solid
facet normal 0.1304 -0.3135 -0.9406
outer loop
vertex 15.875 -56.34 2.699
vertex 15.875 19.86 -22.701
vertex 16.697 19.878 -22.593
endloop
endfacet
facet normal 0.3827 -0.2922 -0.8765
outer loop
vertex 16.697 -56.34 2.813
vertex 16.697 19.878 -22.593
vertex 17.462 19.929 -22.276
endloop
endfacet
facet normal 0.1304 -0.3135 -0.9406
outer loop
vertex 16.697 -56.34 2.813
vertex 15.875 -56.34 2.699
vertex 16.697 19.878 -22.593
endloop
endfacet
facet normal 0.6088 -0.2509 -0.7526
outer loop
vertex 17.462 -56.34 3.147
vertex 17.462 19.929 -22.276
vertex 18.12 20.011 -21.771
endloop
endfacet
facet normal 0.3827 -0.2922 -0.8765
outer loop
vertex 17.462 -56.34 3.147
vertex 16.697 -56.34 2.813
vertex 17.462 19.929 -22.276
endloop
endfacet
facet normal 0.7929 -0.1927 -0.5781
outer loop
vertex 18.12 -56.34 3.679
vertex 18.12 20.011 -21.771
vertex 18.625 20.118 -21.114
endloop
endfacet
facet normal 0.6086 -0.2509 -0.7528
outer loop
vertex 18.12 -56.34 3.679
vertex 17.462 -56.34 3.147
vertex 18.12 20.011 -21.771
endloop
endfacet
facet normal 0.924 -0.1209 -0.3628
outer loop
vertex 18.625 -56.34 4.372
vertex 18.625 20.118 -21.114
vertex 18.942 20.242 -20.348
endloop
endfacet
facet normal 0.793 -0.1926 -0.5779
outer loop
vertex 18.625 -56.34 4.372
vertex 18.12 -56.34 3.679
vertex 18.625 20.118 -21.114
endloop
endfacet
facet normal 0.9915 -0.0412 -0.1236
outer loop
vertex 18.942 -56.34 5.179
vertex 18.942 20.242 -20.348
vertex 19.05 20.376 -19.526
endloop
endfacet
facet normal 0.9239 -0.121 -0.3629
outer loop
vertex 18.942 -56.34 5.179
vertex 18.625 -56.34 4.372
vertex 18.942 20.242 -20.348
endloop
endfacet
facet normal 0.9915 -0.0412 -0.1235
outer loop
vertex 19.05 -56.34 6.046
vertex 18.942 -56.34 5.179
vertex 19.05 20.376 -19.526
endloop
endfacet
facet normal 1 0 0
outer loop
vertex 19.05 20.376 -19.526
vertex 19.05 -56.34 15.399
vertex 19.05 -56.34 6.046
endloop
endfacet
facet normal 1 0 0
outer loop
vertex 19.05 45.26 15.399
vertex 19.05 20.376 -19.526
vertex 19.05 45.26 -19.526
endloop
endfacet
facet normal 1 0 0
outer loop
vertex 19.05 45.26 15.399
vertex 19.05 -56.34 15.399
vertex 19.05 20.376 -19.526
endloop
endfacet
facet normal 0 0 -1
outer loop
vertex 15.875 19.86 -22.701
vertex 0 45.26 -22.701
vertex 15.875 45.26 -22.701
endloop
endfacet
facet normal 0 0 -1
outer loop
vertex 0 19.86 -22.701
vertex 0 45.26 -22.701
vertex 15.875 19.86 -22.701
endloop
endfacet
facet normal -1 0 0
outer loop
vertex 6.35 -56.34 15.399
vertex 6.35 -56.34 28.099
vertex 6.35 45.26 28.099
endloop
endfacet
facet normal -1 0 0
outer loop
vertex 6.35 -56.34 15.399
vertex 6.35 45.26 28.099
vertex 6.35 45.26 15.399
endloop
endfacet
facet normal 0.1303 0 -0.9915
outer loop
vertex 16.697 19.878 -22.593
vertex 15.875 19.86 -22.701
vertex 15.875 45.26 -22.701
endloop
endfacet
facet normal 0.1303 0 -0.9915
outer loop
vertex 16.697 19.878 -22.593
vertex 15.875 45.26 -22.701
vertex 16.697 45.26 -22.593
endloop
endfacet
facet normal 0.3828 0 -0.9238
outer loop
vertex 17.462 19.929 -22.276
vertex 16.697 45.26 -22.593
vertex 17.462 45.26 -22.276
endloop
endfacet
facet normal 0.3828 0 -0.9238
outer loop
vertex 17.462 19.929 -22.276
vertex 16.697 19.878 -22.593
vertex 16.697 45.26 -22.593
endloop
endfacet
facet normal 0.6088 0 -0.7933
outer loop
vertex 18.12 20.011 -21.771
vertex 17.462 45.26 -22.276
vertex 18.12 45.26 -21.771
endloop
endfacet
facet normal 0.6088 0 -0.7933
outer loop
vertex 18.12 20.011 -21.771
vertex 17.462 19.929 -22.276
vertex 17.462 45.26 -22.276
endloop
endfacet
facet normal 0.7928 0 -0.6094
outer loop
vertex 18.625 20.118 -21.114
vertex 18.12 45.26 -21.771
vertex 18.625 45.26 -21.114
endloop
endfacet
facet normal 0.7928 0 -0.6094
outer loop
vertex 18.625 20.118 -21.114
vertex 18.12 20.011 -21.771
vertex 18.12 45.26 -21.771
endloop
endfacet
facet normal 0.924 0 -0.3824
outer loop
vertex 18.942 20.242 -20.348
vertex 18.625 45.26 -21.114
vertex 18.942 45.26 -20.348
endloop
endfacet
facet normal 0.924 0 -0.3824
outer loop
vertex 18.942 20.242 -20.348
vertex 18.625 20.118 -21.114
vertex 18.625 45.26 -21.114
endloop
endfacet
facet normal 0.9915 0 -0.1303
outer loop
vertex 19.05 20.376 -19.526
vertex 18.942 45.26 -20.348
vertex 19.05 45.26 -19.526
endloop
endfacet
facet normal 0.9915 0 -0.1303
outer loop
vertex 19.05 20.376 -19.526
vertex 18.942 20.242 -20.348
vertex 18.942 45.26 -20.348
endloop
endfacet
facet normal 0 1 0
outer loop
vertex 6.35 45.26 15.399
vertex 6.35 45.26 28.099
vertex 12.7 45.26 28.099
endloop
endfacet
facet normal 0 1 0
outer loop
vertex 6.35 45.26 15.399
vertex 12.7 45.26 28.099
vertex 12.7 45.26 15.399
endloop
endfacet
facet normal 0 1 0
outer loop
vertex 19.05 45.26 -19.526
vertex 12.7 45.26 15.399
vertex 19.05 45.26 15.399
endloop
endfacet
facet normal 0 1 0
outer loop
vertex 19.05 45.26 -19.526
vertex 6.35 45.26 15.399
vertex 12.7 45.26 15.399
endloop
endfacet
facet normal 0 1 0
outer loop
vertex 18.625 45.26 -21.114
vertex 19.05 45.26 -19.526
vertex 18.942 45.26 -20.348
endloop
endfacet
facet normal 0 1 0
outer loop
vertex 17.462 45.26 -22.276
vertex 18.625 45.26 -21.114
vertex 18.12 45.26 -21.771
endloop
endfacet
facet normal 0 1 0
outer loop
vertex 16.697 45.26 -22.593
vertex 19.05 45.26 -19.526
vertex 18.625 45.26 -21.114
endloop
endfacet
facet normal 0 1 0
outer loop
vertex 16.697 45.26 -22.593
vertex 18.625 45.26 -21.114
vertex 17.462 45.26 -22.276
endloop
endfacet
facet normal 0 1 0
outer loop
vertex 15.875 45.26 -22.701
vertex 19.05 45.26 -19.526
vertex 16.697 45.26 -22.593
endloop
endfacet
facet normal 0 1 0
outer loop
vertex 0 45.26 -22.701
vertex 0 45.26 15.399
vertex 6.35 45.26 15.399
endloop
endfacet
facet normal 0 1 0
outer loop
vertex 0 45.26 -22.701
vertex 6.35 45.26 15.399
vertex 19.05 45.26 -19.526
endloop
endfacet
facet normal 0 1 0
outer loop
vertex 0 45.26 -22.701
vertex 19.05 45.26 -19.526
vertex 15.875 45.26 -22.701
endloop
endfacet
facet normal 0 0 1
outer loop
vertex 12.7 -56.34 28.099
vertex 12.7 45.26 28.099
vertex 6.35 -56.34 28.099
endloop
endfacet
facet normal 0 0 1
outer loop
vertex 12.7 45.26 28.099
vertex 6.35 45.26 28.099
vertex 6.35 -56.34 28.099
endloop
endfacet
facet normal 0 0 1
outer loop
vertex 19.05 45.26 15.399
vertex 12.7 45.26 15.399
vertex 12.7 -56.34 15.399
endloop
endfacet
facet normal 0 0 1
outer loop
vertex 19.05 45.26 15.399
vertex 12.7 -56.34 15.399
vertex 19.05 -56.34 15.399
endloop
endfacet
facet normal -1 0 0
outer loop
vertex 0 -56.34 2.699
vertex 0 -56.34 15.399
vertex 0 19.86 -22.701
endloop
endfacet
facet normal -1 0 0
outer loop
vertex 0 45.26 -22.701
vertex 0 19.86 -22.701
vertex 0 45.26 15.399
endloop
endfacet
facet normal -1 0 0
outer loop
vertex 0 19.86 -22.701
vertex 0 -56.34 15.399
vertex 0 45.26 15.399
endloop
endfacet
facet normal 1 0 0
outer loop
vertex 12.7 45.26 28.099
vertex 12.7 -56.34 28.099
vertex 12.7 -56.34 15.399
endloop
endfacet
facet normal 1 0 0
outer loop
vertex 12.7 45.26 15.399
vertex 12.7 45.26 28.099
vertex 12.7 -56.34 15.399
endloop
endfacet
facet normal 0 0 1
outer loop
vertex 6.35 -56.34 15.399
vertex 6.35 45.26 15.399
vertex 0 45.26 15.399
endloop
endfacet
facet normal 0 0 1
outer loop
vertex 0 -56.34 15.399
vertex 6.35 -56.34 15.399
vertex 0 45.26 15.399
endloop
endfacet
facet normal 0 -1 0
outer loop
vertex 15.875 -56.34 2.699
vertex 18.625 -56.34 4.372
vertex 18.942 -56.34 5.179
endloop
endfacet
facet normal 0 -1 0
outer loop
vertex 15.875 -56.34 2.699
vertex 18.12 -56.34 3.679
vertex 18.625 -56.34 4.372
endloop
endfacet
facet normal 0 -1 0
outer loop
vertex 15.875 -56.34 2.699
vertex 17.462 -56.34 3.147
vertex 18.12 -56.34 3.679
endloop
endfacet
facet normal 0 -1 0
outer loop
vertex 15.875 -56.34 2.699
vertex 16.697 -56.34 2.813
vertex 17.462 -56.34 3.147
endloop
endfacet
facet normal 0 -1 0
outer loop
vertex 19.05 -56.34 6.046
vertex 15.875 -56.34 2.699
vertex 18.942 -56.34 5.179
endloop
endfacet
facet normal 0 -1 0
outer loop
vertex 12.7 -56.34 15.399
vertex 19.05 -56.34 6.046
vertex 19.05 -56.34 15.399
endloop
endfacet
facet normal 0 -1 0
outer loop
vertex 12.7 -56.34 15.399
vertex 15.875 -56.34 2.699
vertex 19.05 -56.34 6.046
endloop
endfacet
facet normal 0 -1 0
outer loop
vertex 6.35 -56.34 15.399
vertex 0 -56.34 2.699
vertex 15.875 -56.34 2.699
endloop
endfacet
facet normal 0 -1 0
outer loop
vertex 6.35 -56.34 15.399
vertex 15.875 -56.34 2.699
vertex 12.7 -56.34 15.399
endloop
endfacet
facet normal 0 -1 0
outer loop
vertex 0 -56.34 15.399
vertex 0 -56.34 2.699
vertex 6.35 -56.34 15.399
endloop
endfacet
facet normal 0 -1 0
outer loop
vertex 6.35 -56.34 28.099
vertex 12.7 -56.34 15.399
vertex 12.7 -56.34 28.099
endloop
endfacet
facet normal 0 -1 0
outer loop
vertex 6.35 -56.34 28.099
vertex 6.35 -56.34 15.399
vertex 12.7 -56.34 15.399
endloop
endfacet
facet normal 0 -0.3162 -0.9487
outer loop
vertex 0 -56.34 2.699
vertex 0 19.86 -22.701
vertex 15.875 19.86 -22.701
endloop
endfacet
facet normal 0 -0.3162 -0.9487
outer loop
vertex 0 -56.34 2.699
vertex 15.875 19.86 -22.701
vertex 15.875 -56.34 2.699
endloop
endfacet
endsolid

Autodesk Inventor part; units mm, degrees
ref_plane "YZ Plane" through (0, 0, 0) normal (1, 0, 0) x (0, 1, 0)
ref_plane "XZ Plane" through (0, 0, 0) normal (0, 1, 0) x (-1, 0, 0)
ref_plane "XY Plane" through (0, 0, 0) normal (0, 0, 1) x (1, 0, 0)
sketch "Sketch1" plane through (0, 0, 0) normal (1, 0, 0) x (0, 1, 0)
  line L0 (45.2604, 28.0988) -> (45.2604, -22.7012)
  line L1 (45.2604, -22.7012) -> (19.8604, -22.7012)
  line L2 (19.8604, -22.7012) -> (-56.3396, 2.6988)
  line L3 (-56.3396, 2.6988) -> (-56.3396, 28.0988)
  line L4 (45.2604, 28.0988) -> (-56.3396, 28.0988)
  point P0 (0, 0)
  dimension "d0" = 50.8
  dimension "d1" = 25.4
  dimension "d2" = 76.2
  dimension "d3" = 25.4
extrude "Extrusion1" add sketch "Sketch1" along normal blind 19.05
sketch "Sketch2" plane through (0, 45.2604, 28.0988) normal (0, 1, 0) x (1, 0, 0)
  line L0 (19.05, 50.8) -> (19.05, 0) projected
  line L1 (19.05, 0) -> (12.7, 0)
  line L2 (12.7, 0) -> (12.7, 12.7)
  line L3 (12.7, 12.7) -> (19.05, 12.7)
  line L4 (19.05, 12.7) -> (19.05, 0)
  line L5 (0, 0) -> (19.05, 0) projected
  line L6 (0, 0) -> (6.35, 0)
  line L7 (6.35, 0) -> (6.35, 12.7)
  line L8 (6.35, 12.7) -> (0, 12.7)
  line L9 (0, 12.7) -> (0, 0)
  point P0 (0, 28.0988)
  dimension "d6" = 6.35
  dimension "d7" = 12.7
  dimension "d8" = 6.35
extrude "Extrusion2" cut sketch "Sketch2" against normal blind 101.6
fillet "Fillet1" radius 3.175 2 edges at (19.05, -18.2396, -10.0012) (19.05, 32.5604, -22.7012)
equation "\"d9\" = d3 + d2"
properties part number "Right Leg, Side Partt"
